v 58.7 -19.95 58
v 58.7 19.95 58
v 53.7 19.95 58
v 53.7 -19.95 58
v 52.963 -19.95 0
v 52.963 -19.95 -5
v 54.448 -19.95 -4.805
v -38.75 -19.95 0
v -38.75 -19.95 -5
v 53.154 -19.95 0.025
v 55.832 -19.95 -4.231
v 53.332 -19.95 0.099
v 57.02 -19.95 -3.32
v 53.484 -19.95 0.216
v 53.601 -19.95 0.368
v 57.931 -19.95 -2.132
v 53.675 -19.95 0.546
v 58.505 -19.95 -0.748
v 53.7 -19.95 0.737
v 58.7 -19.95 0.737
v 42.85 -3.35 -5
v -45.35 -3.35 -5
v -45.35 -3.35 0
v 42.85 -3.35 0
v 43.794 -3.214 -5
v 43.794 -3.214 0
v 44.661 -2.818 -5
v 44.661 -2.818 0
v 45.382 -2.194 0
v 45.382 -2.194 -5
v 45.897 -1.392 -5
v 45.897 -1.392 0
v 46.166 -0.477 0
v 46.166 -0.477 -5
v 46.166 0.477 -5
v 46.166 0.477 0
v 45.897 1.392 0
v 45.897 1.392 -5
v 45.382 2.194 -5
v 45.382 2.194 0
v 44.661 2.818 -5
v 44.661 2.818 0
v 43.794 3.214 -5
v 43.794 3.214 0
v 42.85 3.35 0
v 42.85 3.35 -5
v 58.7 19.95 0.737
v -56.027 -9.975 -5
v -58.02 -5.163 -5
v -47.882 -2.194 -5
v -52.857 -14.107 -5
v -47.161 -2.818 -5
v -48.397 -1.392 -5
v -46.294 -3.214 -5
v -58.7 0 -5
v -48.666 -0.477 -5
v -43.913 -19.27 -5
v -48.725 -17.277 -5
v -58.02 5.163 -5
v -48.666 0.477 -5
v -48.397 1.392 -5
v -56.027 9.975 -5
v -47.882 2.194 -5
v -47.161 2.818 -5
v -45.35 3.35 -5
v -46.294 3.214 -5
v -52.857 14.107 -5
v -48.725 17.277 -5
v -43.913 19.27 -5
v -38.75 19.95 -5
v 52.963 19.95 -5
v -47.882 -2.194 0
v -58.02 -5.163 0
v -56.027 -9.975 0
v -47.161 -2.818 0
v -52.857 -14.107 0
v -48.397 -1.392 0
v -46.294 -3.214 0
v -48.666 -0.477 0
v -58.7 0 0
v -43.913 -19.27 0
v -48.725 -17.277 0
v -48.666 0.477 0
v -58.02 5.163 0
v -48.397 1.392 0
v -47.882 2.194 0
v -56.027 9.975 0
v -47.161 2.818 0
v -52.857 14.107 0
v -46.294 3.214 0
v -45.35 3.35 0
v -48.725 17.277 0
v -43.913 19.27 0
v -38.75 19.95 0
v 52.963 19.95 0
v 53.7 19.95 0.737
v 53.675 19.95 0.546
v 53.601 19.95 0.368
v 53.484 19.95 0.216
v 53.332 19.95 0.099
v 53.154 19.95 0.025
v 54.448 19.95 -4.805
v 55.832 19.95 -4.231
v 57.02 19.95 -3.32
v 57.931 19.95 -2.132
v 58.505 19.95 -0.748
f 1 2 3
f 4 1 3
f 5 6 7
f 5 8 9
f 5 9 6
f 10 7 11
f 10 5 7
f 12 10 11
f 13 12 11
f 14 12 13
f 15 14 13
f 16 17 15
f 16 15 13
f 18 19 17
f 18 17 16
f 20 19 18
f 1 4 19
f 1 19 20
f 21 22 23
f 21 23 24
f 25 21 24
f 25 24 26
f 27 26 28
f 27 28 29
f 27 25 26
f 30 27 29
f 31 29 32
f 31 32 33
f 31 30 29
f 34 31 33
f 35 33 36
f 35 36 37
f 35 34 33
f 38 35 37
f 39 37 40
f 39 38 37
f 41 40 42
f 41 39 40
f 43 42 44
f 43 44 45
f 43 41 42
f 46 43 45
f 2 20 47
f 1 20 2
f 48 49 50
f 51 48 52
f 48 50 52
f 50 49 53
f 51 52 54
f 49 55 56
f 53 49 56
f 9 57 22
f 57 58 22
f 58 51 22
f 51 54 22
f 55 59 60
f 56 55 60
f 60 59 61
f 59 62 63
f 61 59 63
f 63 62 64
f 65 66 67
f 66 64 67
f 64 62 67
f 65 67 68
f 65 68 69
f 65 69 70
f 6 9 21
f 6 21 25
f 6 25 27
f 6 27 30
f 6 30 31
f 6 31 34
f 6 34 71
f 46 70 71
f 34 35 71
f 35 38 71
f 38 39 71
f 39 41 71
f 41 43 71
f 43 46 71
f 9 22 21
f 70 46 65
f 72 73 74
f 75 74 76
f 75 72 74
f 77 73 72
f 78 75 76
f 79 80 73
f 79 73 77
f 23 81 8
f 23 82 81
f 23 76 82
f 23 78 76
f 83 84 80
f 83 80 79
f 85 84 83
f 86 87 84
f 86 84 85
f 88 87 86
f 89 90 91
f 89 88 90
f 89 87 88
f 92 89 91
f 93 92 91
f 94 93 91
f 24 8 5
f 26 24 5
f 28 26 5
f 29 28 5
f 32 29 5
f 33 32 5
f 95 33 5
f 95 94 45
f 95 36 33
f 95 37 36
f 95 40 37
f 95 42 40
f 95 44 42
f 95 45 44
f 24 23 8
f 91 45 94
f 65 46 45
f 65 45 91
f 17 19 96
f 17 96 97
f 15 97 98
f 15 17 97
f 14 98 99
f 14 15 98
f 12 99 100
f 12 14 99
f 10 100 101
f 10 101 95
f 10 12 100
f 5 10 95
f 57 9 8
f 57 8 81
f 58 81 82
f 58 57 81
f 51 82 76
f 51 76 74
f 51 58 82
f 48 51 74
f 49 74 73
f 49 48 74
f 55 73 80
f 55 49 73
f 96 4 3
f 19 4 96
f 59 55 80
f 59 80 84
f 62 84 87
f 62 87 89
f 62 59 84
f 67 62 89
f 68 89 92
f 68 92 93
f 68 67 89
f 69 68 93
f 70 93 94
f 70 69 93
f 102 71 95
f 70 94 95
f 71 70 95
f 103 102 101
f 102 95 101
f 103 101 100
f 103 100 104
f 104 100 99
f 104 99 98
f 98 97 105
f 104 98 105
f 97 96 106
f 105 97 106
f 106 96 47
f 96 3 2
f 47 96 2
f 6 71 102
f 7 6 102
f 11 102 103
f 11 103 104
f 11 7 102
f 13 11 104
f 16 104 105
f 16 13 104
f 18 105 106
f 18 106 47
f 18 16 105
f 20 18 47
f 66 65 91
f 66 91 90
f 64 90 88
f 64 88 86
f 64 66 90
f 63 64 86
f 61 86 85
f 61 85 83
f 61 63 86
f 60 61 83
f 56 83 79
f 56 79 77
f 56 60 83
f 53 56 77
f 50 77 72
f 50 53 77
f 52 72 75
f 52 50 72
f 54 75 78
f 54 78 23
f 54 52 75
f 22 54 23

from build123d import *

# Parameters (mm, degrees)
SKETCH1_W                    = 117.4
SKETCH1_H                    = 39.9
BASE_FLANGE1_DEPTH           = 5
EDGE_FLANGE1_STRIP_W         = 21.4732
EDGE_FLANGE1_STRIP_H         = 5
EDGE_FLANGE1_STRIP_CUT_DEPTH = 39.9
EDGE_FLANGE1_DEPTH           = 39.9
CUT_EXTRUDE1_START           = -5
CUT_EXTRUDE1_DEPTH           = 5


with BuildPart() as part:
    # Base-Flange1: sheet metal written as solids
    # Sketch1 → Base-Flange1 (new body)
    with BuildSketch(Plane.XY):
        Rectangle(SKETCH1_W, SKETCH1_H)
    extrude(amount=-BASE_FLANGE1_DEPTH)

    # Edge-Flange1: sheet metal written as solids
    # Edge-Flange1 strip (on a plane across the edge) → Edge-Flange1 strip cut (cut)
    with BuildSketch(Plane(origin=(58.7, -19.95, 0), x_dir=(-1, 0, 0), z_dir=(0, 1, 0))):
        with Locations((-5, -2.5)):
            Rectangle(EDGE_FLANGE1_STRIP_W, EDGE_FLANGE1_STRIP_H)
    extrude(amount=EDGE_FLANGE1_STRIP_CUT_DEPTH, mode=Mode.SUBTRACT)

    # Edge-Flange1 section (on a plane across the edge) → Edge-Flange1 (add)
    with BuildSketch(Plane(origin=(58.7, -19.95, 0), x_dir=(-1, 0, 0), z_dir=(0, 1, 0))):
        with BuildLine():
            Line((0, 0.7366), (0, 58))
            Line((0, 58), (5, 58))
            Line((5, 58), (5, 0.7366))
            ThreePointArc((5, 0.7366), (5.215745145, 0.215745145), (5.7366, 0))
            Line((5.7366, 0), (5.7366, -5))
            ThreePointArc((5.7366, -5), (1.680211239, -3.319788761), (0, 0.7366))
        make_face()
    extrude(amount=EDGE_FLANGE1_DEPTH)

    # Cut-Extrude1: read off the stored shape, not the designer's step
    # Cut-Extrude1 outline → Cut-Extrude1 (cut)
    with BuildSketch(Plane.XY.offset(CUT_EXTRUDE1_START)):
        with BuildLine():
            ThreePointArc((-38.75, -19.95), (-52.856780317, -14.106780252), (-58.7, 9.1e-08))
            Line((-58.7, 9.1e-08), (-58.7, -19.95))
            Line((-58.7, -19.95), (-38.75, -19.95))
        make_face()
        with BuildLine():
            ThreePointArc((-58.7, 9.1e-08), (-52.856780252, 14.106780317), (-38.75, 19.95))
            Line((-38.75, 19.95), (-58.7, 19.95))
            Line((-58.7, 19.95), (-58.7, 9.1e-08))
        make_face()
        with BuildLine():
            ThreePointArc((42.85, -3.35), (46.2, 0), (42.85, 3.35))
            Line((42.85, 3.35), (-45.35, 3.35))
            ThreePointArc((-45.35, 3.35), (-48.7, 0), (-45.35, -3.35))
            Line((-45.35, -3.35), (42.85, -3.35))
        make_face()
    extrude(amount=CUT_EXTRUDE1_DEPTH, mode=Mode.SUBTRACT)


solid = part.part
